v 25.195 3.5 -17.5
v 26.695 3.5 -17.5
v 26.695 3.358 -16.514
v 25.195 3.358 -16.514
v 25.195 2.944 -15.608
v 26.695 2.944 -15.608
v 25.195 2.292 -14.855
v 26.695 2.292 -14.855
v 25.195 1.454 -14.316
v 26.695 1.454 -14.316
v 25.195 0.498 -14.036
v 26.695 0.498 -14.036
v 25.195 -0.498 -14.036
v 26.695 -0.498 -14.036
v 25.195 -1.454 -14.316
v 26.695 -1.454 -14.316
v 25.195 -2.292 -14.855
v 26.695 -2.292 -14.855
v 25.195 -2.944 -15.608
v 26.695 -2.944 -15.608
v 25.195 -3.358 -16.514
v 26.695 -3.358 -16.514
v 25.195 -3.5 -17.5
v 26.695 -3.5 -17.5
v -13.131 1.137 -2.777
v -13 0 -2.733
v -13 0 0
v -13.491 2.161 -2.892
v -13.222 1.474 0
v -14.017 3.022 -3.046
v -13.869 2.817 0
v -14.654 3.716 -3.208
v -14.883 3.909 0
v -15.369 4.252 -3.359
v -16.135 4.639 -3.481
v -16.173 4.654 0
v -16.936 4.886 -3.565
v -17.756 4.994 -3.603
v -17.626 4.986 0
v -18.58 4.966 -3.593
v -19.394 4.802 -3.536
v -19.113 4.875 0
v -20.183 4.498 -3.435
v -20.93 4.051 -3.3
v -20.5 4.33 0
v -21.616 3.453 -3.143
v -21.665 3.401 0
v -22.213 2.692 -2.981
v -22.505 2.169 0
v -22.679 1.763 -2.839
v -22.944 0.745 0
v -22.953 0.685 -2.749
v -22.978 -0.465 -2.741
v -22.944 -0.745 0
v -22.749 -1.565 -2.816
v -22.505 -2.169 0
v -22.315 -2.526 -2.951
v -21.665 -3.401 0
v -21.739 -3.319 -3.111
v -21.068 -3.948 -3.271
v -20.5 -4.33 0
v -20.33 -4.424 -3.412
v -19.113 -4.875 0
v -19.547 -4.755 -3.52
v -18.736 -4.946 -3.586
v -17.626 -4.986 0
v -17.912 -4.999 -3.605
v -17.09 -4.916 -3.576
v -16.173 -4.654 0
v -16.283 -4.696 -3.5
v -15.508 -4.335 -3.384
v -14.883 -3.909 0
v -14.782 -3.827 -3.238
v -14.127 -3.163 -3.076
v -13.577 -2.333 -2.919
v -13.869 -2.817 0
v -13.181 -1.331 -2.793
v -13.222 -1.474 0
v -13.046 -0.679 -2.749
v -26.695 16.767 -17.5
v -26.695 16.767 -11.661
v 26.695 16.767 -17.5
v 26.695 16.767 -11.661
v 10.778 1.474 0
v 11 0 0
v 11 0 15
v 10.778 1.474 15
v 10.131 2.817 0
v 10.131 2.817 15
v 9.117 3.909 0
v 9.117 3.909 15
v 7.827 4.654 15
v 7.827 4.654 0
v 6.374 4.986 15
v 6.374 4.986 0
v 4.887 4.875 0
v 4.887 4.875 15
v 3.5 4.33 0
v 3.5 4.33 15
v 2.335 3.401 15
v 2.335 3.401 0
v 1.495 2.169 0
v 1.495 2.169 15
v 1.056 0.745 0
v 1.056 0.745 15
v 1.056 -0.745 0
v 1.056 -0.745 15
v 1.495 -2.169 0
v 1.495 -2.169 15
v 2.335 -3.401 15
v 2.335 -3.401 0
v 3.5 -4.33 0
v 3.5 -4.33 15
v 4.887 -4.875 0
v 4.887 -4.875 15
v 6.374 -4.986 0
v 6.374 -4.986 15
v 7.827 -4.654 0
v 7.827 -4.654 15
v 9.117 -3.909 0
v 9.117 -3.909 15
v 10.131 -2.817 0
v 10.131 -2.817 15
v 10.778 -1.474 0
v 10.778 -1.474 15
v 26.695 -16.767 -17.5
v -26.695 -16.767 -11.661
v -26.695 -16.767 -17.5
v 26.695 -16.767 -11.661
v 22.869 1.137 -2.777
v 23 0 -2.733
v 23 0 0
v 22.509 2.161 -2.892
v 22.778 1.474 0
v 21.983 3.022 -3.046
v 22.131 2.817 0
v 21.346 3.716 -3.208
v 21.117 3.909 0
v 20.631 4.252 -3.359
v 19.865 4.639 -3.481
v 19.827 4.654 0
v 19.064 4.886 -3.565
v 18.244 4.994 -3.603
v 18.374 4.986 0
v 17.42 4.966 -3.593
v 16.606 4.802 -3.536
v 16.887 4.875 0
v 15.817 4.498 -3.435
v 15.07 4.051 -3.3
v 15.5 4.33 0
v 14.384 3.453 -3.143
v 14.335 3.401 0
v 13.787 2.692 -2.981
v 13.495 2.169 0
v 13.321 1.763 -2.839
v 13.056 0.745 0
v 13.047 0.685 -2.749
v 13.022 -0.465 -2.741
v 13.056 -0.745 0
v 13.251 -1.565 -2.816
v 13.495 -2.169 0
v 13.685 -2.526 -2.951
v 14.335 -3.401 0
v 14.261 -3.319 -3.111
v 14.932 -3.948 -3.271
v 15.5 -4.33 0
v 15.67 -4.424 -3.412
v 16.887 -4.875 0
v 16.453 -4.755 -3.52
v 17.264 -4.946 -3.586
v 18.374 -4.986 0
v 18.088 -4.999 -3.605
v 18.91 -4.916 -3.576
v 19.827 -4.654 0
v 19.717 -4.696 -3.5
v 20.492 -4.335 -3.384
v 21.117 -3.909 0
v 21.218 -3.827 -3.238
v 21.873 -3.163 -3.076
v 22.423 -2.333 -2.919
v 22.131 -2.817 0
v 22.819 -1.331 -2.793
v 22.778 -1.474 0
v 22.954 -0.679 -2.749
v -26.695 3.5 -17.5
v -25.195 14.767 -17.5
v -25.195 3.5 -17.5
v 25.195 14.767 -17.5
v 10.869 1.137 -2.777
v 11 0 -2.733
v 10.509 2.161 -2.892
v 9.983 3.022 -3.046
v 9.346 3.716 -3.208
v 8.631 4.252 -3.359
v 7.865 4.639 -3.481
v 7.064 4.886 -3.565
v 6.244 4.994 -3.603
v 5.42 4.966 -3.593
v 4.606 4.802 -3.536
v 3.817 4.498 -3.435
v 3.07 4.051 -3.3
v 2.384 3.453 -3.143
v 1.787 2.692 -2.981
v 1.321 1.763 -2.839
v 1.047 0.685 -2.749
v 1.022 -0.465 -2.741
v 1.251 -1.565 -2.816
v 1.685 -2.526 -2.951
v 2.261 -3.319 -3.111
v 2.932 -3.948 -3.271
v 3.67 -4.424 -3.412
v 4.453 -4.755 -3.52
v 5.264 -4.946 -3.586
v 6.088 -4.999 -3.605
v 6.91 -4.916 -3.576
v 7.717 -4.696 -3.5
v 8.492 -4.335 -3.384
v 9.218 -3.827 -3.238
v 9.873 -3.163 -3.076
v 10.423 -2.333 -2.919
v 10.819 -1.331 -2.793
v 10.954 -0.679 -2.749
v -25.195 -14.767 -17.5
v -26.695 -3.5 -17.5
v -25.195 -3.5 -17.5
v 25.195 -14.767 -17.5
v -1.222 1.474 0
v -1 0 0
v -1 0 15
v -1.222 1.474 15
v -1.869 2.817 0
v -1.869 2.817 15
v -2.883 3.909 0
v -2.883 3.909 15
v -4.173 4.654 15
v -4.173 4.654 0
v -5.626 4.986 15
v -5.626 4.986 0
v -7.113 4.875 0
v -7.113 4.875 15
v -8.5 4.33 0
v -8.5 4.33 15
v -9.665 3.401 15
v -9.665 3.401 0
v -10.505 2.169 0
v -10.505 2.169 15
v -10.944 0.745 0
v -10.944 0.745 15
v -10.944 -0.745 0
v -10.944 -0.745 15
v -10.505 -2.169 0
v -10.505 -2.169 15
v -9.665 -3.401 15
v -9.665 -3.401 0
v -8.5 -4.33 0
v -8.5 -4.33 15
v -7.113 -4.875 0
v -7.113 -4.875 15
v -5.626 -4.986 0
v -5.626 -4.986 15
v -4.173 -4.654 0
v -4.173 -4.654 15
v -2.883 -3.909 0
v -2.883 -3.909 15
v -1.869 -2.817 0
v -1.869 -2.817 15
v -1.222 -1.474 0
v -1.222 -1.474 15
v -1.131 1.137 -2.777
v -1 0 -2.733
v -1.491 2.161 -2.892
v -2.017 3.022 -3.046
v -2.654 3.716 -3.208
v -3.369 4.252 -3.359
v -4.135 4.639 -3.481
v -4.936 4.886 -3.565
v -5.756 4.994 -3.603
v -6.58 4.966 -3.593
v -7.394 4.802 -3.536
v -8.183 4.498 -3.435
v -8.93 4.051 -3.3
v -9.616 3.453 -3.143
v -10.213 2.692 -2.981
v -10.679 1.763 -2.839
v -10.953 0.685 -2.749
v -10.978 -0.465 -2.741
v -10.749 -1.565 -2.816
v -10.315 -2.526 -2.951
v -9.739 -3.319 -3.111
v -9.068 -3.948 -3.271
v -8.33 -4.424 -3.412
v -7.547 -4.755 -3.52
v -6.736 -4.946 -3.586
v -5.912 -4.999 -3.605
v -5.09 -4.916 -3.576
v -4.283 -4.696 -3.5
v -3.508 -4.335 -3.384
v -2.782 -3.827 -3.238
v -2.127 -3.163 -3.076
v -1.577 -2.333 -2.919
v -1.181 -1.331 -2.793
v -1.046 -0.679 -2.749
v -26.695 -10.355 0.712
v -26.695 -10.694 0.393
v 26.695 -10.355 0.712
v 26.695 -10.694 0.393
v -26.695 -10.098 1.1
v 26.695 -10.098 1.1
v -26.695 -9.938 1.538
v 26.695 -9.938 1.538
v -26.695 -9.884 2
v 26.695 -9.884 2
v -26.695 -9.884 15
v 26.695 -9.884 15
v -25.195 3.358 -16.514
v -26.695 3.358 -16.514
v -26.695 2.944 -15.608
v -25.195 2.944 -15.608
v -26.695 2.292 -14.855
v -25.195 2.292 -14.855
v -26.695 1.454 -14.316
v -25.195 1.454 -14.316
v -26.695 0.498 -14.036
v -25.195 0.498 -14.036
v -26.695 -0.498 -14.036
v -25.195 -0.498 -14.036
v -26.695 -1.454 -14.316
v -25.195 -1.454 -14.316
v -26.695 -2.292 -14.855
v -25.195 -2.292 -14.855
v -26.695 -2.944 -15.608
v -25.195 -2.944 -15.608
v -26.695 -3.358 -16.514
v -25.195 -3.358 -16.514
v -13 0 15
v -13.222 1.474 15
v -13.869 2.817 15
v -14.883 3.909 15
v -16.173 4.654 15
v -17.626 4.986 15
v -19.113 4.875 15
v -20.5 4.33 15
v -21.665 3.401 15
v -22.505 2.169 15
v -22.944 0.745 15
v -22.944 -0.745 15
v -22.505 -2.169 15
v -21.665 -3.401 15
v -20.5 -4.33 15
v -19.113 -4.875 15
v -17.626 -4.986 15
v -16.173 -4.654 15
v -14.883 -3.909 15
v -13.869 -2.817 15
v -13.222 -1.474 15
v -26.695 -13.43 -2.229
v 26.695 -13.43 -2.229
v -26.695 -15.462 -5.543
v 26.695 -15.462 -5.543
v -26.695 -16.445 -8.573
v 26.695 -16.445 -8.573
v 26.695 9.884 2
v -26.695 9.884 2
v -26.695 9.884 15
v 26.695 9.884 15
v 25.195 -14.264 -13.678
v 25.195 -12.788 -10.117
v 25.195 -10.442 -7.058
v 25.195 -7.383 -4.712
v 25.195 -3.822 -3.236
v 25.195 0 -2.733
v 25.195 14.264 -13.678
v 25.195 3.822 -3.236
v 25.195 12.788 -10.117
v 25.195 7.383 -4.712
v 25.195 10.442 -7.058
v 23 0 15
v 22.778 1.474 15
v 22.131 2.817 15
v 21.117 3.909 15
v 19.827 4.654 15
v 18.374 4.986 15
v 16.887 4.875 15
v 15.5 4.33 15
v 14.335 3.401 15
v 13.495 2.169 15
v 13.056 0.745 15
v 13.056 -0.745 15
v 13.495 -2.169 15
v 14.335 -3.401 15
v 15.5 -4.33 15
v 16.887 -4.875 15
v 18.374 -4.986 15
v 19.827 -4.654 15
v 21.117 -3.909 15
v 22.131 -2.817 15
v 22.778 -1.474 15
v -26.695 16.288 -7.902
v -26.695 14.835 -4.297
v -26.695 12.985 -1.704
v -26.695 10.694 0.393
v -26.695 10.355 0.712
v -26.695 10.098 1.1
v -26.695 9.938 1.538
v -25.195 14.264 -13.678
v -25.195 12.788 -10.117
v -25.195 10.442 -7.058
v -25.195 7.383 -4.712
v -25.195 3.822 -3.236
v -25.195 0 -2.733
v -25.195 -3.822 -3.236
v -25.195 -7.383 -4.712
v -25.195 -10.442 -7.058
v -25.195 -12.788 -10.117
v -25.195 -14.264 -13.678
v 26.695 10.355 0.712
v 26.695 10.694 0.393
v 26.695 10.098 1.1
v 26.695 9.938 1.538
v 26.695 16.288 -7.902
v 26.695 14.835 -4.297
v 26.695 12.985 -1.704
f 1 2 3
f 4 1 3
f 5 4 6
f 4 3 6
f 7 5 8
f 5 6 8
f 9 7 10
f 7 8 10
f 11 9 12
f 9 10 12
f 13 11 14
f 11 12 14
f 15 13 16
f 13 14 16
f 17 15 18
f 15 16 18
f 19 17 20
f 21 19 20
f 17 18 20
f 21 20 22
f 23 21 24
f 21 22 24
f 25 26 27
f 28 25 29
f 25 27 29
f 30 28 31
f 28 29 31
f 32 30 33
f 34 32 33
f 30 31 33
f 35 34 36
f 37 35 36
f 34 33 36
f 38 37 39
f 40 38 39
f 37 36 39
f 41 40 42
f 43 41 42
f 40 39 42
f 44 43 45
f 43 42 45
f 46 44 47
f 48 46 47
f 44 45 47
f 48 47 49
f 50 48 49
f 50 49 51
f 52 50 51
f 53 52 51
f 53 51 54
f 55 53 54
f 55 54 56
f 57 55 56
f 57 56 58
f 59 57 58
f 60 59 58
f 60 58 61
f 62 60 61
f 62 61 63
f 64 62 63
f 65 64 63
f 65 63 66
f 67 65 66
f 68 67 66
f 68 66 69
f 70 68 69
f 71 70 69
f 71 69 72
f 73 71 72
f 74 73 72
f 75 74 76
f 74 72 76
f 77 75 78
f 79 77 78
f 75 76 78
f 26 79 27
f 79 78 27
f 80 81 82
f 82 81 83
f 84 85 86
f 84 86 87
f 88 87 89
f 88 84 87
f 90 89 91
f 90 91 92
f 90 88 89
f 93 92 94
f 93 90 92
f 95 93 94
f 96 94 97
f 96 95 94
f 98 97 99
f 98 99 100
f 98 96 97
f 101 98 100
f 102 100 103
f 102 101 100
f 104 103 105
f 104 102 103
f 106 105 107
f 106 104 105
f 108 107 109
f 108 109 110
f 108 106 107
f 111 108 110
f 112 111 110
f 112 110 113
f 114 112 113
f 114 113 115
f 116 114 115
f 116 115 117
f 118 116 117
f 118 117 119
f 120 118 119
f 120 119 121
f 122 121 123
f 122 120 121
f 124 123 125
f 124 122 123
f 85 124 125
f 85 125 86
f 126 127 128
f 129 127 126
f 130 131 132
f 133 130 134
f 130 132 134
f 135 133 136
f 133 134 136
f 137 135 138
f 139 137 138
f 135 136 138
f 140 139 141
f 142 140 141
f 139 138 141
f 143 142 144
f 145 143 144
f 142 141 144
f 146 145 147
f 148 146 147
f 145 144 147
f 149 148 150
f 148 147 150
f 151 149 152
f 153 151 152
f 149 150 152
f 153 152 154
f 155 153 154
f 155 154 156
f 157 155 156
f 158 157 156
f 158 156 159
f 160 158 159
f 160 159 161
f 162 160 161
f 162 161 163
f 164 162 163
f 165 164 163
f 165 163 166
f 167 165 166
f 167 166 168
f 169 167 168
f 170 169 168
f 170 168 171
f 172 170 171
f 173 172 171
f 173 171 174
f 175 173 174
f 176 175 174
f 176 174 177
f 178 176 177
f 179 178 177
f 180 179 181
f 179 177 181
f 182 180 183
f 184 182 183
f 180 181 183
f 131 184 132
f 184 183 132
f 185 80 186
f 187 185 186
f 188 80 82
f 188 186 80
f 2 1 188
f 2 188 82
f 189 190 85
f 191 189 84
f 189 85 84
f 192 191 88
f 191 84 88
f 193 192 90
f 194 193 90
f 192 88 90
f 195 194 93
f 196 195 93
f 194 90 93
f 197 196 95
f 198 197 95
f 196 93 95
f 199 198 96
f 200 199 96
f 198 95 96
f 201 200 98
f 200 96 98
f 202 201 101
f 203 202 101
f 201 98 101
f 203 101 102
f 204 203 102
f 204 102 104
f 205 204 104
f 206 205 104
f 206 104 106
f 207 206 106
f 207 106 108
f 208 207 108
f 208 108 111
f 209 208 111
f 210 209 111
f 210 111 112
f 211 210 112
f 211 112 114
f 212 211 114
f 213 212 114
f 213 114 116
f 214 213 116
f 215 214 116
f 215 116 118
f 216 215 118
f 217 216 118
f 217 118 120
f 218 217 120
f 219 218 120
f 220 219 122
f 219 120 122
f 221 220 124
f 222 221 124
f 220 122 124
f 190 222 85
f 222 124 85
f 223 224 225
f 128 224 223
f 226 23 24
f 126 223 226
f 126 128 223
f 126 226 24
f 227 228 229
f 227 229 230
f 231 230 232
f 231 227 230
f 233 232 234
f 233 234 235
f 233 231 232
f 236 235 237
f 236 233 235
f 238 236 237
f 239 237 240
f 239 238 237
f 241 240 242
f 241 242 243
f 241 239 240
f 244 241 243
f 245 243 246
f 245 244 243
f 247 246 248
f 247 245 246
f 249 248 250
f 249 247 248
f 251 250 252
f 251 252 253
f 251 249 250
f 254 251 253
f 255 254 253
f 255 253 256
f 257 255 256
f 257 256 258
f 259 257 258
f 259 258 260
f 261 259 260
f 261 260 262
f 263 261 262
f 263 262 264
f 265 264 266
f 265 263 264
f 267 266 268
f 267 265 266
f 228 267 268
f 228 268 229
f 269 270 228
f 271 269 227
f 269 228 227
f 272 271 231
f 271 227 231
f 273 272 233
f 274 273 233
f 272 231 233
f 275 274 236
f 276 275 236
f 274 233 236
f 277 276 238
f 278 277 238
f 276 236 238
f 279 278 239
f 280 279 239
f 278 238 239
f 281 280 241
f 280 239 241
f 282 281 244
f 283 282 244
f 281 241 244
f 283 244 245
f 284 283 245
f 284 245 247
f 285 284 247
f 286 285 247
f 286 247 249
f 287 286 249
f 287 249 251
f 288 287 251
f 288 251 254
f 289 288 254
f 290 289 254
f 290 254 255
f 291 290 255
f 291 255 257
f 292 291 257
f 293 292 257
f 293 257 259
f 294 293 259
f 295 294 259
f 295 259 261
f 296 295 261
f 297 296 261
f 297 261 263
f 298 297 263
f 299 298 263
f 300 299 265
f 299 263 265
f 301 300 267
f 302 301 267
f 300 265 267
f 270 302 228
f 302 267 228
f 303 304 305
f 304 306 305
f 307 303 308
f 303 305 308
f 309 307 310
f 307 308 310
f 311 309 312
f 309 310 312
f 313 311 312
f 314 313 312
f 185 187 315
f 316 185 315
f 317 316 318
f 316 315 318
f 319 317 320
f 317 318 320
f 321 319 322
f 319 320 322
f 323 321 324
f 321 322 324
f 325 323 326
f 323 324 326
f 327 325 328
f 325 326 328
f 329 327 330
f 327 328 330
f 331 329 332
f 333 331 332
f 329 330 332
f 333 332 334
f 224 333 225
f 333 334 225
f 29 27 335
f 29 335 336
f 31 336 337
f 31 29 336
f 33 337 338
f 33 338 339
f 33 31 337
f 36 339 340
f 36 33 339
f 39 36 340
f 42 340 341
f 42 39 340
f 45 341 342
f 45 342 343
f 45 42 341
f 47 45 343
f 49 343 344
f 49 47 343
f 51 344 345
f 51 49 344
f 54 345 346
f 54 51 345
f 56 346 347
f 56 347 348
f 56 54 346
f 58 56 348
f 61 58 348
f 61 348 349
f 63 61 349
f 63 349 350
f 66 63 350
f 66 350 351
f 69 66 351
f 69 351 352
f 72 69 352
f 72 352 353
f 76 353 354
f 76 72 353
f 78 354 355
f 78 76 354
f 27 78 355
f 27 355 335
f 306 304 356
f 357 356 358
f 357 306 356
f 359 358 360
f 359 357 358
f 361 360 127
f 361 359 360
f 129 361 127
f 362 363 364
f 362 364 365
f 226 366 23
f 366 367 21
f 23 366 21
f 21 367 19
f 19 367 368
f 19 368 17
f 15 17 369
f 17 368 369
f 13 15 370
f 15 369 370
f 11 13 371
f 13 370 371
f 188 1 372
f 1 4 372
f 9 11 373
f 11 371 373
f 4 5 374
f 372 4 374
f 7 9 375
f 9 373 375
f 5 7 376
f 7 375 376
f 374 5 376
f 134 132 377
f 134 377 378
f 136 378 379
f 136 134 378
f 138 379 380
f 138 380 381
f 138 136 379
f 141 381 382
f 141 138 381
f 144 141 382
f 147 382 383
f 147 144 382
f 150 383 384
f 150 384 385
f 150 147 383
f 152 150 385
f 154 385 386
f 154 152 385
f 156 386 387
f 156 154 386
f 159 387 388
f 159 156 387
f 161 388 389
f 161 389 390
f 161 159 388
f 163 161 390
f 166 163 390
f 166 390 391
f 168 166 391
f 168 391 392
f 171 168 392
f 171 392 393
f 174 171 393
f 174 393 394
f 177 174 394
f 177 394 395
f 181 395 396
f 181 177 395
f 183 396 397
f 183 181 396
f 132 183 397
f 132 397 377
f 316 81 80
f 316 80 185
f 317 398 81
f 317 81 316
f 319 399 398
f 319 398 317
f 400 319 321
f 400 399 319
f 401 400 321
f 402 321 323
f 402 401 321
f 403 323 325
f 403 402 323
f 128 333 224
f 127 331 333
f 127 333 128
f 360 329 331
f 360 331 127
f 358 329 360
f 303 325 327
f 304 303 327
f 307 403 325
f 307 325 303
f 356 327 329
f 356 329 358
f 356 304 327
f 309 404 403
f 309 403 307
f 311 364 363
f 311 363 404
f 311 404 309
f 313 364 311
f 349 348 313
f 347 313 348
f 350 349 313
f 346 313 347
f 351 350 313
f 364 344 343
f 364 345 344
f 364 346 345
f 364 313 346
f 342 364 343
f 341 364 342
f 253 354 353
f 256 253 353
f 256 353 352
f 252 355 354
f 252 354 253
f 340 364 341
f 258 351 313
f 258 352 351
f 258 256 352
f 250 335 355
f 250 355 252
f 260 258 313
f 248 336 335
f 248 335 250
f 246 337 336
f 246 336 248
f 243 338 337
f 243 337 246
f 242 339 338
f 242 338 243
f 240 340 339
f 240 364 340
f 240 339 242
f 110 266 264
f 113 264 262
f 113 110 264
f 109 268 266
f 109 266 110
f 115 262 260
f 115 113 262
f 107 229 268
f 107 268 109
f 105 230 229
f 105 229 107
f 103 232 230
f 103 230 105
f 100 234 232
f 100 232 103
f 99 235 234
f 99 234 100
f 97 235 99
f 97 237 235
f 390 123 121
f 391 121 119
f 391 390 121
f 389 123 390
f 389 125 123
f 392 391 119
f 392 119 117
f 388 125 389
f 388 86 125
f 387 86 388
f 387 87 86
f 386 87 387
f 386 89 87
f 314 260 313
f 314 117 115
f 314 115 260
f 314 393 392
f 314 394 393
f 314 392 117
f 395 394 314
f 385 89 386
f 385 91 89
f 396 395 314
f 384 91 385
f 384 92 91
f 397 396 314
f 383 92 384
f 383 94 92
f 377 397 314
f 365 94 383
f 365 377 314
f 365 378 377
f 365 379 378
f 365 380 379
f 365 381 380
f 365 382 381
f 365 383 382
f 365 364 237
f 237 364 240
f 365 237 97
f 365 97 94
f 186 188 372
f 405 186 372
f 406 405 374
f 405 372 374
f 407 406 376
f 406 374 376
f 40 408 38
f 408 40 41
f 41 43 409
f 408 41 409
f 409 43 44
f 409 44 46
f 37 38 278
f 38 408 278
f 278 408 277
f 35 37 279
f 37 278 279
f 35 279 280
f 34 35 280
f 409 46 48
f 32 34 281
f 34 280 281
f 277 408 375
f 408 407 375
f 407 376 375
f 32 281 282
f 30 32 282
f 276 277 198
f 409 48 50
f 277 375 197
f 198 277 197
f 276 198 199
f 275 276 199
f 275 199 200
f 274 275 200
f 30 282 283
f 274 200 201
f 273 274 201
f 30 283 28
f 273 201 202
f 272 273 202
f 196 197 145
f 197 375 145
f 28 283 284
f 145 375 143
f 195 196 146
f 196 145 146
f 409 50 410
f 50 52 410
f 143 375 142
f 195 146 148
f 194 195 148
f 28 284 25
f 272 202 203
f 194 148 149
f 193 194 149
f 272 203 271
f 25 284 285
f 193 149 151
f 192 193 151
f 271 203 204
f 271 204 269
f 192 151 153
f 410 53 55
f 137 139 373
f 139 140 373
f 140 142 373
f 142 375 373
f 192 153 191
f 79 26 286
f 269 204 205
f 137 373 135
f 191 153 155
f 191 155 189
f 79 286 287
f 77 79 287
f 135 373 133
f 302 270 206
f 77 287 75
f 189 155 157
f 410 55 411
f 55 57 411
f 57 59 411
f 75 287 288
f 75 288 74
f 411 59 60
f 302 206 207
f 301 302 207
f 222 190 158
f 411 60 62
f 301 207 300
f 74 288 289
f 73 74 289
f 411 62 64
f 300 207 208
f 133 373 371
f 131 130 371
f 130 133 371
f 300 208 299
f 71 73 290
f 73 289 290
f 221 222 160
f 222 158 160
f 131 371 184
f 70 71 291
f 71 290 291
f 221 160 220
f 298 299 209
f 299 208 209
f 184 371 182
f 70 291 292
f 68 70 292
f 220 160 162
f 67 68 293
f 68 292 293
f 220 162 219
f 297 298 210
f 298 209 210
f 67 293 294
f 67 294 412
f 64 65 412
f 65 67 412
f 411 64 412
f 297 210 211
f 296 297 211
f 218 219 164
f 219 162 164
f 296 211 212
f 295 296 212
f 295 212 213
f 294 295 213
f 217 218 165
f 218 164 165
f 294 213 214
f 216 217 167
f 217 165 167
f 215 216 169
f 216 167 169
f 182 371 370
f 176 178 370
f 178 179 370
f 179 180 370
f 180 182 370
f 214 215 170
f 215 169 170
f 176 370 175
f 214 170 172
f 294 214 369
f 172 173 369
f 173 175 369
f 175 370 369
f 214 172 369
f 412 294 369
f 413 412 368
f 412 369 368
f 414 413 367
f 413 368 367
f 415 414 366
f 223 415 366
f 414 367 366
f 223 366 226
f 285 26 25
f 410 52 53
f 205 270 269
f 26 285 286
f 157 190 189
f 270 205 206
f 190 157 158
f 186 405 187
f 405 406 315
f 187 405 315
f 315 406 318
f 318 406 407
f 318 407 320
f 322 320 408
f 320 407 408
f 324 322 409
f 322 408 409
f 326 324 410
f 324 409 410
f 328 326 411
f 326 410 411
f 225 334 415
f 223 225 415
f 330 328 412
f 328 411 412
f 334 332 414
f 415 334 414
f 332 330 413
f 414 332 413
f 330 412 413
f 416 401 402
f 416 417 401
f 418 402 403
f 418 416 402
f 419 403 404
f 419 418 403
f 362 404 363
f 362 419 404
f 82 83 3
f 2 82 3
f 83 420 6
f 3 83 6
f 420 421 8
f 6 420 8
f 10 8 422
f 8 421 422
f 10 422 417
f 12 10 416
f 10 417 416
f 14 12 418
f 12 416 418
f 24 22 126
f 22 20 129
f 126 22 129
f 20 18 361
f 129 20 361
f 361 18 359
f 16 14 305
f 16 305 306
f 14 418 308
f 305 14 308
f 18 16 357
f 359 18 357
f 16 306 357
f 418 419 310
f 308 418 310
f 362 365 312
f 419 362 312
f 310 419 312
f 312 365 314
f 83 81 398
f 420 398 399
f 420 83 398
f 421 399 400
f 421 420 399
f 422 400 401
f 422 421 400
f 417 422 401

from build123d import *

# Parameters (mm, degrees)
F0_W     = 53.390044
F0_H     = 19.768442
F0_R     = 5
F1_DEPTH = 15
F3_W     = 53.390044
F3_H     = 33.533428
F4_DEPTH = 17.5
F5_R     = 2
F6_R     = 15
F2_R     = 5
F7_DEPTH = 44.269914


with BuildPart() as f1:
    # F0 (on Top) → F1 (new body)
    with BuildSketch(Plane.XY):
        Rectangle(F0_W, F0_H)
        with Locations((-18, 0)):
            Circle(F0_R, mode=Mode.SUBTRACT)
        with Locations((-6, 0)):
            Circle(F0_R, mode=Mode.SUBTRACT)
        with Locations((6, 0)):
            Circle(F0_R, mode=Mode.SUBTRACT)
        with Locations((18, 0)):
            Circle(F0_R, mode=Mode.SUBTRACT)
    extrude(amount=F1_DEPTH)

    # F3 (on face) → F4 (join)
    with BuildSketch(Plane(origin=(0, 0, 0), x_dir=(1, 0, 0), z_dir=(0, 0, -1))):
        Rectangle(F3_W, F3_H)
    extrude(amount=F4_DEPTH)

    # F5
    f5_edges = [f1.edges().sort_by_distance(p)[0] for p in [
        (0, 9.884221, 0),
        (0, -9.884221, 0),
    ]]
    fillet(f5_edges, radius=F5_R)

    # F6
    f6_edges = [f1.edges().sort_by_distance(p)[0] for p in [
        (0, -16.766714, 0),
        (0, 16.766714, 0),
    ]]
    fillet(f6_edges, radius=F6_R)

    # F2 (on face) → F7 (cut)
    with BuildSketch(Plane.XY.offset(15)):
        with Locations((-18, 0)):
            Circle(F2_R)
        with Locations((-6, 0)):
            Circle(F2_R)
        with Locations((6, 0)):
            Circle(F2_R)
        with Locations((18, 0)):
            Circle(F2_R)
    extrude(amount=-F7_DEPTH, mode=Mode.SUBTRACT)

    # F8 (on face) → F9 (revolve, cut)
    with BuildSketch(Plane(origin=(0, 0, -17.5), x_dir=(1, 0, 0), z_dir=(0, 0, -1))):
        with BuildLine():
            Line((26.695022, 0), (23, 0))
            ThreePointArc((23, 0), (18, -5), (13, 0))
            Line((13, 0), (11, 0))
            ThreePointArc((11, 0), (6, -5), (1, 0))
            Line((1, 0), (-1, 0))
            ThreePointArc((-1, 0), (-6, -5), (-11, 0))
            Line((-11, 0), (-13, 0))
            ThreePointArc((-13, 0), (-18, -5), (-23, 0))
            Line((-23, 0), (-26.695022, 0))
            Line((-26.695022, 0), (-26.695022, -3.5))
            Line((-26.695022, -3.5), (-25.195022, -3.5))
            Line((-25.195022, -3.5), (-25.195022, -14.766714))
            Line((-25.195022, -14.766714), (25.195022, -14.766714))
            Line((25.195022, -14.766714), (25.195022, -3.5))
            Line((25.195022, -3.5), (26.695022, -3.5))
            Line((26.695022, -3.5), (26.695022, 0))
        make_face()
    revolve(axis=Axis((0, 0, -17.5), (1, 0, 0)), mode=Mode.SUBTRACT)


solid = f1.part
